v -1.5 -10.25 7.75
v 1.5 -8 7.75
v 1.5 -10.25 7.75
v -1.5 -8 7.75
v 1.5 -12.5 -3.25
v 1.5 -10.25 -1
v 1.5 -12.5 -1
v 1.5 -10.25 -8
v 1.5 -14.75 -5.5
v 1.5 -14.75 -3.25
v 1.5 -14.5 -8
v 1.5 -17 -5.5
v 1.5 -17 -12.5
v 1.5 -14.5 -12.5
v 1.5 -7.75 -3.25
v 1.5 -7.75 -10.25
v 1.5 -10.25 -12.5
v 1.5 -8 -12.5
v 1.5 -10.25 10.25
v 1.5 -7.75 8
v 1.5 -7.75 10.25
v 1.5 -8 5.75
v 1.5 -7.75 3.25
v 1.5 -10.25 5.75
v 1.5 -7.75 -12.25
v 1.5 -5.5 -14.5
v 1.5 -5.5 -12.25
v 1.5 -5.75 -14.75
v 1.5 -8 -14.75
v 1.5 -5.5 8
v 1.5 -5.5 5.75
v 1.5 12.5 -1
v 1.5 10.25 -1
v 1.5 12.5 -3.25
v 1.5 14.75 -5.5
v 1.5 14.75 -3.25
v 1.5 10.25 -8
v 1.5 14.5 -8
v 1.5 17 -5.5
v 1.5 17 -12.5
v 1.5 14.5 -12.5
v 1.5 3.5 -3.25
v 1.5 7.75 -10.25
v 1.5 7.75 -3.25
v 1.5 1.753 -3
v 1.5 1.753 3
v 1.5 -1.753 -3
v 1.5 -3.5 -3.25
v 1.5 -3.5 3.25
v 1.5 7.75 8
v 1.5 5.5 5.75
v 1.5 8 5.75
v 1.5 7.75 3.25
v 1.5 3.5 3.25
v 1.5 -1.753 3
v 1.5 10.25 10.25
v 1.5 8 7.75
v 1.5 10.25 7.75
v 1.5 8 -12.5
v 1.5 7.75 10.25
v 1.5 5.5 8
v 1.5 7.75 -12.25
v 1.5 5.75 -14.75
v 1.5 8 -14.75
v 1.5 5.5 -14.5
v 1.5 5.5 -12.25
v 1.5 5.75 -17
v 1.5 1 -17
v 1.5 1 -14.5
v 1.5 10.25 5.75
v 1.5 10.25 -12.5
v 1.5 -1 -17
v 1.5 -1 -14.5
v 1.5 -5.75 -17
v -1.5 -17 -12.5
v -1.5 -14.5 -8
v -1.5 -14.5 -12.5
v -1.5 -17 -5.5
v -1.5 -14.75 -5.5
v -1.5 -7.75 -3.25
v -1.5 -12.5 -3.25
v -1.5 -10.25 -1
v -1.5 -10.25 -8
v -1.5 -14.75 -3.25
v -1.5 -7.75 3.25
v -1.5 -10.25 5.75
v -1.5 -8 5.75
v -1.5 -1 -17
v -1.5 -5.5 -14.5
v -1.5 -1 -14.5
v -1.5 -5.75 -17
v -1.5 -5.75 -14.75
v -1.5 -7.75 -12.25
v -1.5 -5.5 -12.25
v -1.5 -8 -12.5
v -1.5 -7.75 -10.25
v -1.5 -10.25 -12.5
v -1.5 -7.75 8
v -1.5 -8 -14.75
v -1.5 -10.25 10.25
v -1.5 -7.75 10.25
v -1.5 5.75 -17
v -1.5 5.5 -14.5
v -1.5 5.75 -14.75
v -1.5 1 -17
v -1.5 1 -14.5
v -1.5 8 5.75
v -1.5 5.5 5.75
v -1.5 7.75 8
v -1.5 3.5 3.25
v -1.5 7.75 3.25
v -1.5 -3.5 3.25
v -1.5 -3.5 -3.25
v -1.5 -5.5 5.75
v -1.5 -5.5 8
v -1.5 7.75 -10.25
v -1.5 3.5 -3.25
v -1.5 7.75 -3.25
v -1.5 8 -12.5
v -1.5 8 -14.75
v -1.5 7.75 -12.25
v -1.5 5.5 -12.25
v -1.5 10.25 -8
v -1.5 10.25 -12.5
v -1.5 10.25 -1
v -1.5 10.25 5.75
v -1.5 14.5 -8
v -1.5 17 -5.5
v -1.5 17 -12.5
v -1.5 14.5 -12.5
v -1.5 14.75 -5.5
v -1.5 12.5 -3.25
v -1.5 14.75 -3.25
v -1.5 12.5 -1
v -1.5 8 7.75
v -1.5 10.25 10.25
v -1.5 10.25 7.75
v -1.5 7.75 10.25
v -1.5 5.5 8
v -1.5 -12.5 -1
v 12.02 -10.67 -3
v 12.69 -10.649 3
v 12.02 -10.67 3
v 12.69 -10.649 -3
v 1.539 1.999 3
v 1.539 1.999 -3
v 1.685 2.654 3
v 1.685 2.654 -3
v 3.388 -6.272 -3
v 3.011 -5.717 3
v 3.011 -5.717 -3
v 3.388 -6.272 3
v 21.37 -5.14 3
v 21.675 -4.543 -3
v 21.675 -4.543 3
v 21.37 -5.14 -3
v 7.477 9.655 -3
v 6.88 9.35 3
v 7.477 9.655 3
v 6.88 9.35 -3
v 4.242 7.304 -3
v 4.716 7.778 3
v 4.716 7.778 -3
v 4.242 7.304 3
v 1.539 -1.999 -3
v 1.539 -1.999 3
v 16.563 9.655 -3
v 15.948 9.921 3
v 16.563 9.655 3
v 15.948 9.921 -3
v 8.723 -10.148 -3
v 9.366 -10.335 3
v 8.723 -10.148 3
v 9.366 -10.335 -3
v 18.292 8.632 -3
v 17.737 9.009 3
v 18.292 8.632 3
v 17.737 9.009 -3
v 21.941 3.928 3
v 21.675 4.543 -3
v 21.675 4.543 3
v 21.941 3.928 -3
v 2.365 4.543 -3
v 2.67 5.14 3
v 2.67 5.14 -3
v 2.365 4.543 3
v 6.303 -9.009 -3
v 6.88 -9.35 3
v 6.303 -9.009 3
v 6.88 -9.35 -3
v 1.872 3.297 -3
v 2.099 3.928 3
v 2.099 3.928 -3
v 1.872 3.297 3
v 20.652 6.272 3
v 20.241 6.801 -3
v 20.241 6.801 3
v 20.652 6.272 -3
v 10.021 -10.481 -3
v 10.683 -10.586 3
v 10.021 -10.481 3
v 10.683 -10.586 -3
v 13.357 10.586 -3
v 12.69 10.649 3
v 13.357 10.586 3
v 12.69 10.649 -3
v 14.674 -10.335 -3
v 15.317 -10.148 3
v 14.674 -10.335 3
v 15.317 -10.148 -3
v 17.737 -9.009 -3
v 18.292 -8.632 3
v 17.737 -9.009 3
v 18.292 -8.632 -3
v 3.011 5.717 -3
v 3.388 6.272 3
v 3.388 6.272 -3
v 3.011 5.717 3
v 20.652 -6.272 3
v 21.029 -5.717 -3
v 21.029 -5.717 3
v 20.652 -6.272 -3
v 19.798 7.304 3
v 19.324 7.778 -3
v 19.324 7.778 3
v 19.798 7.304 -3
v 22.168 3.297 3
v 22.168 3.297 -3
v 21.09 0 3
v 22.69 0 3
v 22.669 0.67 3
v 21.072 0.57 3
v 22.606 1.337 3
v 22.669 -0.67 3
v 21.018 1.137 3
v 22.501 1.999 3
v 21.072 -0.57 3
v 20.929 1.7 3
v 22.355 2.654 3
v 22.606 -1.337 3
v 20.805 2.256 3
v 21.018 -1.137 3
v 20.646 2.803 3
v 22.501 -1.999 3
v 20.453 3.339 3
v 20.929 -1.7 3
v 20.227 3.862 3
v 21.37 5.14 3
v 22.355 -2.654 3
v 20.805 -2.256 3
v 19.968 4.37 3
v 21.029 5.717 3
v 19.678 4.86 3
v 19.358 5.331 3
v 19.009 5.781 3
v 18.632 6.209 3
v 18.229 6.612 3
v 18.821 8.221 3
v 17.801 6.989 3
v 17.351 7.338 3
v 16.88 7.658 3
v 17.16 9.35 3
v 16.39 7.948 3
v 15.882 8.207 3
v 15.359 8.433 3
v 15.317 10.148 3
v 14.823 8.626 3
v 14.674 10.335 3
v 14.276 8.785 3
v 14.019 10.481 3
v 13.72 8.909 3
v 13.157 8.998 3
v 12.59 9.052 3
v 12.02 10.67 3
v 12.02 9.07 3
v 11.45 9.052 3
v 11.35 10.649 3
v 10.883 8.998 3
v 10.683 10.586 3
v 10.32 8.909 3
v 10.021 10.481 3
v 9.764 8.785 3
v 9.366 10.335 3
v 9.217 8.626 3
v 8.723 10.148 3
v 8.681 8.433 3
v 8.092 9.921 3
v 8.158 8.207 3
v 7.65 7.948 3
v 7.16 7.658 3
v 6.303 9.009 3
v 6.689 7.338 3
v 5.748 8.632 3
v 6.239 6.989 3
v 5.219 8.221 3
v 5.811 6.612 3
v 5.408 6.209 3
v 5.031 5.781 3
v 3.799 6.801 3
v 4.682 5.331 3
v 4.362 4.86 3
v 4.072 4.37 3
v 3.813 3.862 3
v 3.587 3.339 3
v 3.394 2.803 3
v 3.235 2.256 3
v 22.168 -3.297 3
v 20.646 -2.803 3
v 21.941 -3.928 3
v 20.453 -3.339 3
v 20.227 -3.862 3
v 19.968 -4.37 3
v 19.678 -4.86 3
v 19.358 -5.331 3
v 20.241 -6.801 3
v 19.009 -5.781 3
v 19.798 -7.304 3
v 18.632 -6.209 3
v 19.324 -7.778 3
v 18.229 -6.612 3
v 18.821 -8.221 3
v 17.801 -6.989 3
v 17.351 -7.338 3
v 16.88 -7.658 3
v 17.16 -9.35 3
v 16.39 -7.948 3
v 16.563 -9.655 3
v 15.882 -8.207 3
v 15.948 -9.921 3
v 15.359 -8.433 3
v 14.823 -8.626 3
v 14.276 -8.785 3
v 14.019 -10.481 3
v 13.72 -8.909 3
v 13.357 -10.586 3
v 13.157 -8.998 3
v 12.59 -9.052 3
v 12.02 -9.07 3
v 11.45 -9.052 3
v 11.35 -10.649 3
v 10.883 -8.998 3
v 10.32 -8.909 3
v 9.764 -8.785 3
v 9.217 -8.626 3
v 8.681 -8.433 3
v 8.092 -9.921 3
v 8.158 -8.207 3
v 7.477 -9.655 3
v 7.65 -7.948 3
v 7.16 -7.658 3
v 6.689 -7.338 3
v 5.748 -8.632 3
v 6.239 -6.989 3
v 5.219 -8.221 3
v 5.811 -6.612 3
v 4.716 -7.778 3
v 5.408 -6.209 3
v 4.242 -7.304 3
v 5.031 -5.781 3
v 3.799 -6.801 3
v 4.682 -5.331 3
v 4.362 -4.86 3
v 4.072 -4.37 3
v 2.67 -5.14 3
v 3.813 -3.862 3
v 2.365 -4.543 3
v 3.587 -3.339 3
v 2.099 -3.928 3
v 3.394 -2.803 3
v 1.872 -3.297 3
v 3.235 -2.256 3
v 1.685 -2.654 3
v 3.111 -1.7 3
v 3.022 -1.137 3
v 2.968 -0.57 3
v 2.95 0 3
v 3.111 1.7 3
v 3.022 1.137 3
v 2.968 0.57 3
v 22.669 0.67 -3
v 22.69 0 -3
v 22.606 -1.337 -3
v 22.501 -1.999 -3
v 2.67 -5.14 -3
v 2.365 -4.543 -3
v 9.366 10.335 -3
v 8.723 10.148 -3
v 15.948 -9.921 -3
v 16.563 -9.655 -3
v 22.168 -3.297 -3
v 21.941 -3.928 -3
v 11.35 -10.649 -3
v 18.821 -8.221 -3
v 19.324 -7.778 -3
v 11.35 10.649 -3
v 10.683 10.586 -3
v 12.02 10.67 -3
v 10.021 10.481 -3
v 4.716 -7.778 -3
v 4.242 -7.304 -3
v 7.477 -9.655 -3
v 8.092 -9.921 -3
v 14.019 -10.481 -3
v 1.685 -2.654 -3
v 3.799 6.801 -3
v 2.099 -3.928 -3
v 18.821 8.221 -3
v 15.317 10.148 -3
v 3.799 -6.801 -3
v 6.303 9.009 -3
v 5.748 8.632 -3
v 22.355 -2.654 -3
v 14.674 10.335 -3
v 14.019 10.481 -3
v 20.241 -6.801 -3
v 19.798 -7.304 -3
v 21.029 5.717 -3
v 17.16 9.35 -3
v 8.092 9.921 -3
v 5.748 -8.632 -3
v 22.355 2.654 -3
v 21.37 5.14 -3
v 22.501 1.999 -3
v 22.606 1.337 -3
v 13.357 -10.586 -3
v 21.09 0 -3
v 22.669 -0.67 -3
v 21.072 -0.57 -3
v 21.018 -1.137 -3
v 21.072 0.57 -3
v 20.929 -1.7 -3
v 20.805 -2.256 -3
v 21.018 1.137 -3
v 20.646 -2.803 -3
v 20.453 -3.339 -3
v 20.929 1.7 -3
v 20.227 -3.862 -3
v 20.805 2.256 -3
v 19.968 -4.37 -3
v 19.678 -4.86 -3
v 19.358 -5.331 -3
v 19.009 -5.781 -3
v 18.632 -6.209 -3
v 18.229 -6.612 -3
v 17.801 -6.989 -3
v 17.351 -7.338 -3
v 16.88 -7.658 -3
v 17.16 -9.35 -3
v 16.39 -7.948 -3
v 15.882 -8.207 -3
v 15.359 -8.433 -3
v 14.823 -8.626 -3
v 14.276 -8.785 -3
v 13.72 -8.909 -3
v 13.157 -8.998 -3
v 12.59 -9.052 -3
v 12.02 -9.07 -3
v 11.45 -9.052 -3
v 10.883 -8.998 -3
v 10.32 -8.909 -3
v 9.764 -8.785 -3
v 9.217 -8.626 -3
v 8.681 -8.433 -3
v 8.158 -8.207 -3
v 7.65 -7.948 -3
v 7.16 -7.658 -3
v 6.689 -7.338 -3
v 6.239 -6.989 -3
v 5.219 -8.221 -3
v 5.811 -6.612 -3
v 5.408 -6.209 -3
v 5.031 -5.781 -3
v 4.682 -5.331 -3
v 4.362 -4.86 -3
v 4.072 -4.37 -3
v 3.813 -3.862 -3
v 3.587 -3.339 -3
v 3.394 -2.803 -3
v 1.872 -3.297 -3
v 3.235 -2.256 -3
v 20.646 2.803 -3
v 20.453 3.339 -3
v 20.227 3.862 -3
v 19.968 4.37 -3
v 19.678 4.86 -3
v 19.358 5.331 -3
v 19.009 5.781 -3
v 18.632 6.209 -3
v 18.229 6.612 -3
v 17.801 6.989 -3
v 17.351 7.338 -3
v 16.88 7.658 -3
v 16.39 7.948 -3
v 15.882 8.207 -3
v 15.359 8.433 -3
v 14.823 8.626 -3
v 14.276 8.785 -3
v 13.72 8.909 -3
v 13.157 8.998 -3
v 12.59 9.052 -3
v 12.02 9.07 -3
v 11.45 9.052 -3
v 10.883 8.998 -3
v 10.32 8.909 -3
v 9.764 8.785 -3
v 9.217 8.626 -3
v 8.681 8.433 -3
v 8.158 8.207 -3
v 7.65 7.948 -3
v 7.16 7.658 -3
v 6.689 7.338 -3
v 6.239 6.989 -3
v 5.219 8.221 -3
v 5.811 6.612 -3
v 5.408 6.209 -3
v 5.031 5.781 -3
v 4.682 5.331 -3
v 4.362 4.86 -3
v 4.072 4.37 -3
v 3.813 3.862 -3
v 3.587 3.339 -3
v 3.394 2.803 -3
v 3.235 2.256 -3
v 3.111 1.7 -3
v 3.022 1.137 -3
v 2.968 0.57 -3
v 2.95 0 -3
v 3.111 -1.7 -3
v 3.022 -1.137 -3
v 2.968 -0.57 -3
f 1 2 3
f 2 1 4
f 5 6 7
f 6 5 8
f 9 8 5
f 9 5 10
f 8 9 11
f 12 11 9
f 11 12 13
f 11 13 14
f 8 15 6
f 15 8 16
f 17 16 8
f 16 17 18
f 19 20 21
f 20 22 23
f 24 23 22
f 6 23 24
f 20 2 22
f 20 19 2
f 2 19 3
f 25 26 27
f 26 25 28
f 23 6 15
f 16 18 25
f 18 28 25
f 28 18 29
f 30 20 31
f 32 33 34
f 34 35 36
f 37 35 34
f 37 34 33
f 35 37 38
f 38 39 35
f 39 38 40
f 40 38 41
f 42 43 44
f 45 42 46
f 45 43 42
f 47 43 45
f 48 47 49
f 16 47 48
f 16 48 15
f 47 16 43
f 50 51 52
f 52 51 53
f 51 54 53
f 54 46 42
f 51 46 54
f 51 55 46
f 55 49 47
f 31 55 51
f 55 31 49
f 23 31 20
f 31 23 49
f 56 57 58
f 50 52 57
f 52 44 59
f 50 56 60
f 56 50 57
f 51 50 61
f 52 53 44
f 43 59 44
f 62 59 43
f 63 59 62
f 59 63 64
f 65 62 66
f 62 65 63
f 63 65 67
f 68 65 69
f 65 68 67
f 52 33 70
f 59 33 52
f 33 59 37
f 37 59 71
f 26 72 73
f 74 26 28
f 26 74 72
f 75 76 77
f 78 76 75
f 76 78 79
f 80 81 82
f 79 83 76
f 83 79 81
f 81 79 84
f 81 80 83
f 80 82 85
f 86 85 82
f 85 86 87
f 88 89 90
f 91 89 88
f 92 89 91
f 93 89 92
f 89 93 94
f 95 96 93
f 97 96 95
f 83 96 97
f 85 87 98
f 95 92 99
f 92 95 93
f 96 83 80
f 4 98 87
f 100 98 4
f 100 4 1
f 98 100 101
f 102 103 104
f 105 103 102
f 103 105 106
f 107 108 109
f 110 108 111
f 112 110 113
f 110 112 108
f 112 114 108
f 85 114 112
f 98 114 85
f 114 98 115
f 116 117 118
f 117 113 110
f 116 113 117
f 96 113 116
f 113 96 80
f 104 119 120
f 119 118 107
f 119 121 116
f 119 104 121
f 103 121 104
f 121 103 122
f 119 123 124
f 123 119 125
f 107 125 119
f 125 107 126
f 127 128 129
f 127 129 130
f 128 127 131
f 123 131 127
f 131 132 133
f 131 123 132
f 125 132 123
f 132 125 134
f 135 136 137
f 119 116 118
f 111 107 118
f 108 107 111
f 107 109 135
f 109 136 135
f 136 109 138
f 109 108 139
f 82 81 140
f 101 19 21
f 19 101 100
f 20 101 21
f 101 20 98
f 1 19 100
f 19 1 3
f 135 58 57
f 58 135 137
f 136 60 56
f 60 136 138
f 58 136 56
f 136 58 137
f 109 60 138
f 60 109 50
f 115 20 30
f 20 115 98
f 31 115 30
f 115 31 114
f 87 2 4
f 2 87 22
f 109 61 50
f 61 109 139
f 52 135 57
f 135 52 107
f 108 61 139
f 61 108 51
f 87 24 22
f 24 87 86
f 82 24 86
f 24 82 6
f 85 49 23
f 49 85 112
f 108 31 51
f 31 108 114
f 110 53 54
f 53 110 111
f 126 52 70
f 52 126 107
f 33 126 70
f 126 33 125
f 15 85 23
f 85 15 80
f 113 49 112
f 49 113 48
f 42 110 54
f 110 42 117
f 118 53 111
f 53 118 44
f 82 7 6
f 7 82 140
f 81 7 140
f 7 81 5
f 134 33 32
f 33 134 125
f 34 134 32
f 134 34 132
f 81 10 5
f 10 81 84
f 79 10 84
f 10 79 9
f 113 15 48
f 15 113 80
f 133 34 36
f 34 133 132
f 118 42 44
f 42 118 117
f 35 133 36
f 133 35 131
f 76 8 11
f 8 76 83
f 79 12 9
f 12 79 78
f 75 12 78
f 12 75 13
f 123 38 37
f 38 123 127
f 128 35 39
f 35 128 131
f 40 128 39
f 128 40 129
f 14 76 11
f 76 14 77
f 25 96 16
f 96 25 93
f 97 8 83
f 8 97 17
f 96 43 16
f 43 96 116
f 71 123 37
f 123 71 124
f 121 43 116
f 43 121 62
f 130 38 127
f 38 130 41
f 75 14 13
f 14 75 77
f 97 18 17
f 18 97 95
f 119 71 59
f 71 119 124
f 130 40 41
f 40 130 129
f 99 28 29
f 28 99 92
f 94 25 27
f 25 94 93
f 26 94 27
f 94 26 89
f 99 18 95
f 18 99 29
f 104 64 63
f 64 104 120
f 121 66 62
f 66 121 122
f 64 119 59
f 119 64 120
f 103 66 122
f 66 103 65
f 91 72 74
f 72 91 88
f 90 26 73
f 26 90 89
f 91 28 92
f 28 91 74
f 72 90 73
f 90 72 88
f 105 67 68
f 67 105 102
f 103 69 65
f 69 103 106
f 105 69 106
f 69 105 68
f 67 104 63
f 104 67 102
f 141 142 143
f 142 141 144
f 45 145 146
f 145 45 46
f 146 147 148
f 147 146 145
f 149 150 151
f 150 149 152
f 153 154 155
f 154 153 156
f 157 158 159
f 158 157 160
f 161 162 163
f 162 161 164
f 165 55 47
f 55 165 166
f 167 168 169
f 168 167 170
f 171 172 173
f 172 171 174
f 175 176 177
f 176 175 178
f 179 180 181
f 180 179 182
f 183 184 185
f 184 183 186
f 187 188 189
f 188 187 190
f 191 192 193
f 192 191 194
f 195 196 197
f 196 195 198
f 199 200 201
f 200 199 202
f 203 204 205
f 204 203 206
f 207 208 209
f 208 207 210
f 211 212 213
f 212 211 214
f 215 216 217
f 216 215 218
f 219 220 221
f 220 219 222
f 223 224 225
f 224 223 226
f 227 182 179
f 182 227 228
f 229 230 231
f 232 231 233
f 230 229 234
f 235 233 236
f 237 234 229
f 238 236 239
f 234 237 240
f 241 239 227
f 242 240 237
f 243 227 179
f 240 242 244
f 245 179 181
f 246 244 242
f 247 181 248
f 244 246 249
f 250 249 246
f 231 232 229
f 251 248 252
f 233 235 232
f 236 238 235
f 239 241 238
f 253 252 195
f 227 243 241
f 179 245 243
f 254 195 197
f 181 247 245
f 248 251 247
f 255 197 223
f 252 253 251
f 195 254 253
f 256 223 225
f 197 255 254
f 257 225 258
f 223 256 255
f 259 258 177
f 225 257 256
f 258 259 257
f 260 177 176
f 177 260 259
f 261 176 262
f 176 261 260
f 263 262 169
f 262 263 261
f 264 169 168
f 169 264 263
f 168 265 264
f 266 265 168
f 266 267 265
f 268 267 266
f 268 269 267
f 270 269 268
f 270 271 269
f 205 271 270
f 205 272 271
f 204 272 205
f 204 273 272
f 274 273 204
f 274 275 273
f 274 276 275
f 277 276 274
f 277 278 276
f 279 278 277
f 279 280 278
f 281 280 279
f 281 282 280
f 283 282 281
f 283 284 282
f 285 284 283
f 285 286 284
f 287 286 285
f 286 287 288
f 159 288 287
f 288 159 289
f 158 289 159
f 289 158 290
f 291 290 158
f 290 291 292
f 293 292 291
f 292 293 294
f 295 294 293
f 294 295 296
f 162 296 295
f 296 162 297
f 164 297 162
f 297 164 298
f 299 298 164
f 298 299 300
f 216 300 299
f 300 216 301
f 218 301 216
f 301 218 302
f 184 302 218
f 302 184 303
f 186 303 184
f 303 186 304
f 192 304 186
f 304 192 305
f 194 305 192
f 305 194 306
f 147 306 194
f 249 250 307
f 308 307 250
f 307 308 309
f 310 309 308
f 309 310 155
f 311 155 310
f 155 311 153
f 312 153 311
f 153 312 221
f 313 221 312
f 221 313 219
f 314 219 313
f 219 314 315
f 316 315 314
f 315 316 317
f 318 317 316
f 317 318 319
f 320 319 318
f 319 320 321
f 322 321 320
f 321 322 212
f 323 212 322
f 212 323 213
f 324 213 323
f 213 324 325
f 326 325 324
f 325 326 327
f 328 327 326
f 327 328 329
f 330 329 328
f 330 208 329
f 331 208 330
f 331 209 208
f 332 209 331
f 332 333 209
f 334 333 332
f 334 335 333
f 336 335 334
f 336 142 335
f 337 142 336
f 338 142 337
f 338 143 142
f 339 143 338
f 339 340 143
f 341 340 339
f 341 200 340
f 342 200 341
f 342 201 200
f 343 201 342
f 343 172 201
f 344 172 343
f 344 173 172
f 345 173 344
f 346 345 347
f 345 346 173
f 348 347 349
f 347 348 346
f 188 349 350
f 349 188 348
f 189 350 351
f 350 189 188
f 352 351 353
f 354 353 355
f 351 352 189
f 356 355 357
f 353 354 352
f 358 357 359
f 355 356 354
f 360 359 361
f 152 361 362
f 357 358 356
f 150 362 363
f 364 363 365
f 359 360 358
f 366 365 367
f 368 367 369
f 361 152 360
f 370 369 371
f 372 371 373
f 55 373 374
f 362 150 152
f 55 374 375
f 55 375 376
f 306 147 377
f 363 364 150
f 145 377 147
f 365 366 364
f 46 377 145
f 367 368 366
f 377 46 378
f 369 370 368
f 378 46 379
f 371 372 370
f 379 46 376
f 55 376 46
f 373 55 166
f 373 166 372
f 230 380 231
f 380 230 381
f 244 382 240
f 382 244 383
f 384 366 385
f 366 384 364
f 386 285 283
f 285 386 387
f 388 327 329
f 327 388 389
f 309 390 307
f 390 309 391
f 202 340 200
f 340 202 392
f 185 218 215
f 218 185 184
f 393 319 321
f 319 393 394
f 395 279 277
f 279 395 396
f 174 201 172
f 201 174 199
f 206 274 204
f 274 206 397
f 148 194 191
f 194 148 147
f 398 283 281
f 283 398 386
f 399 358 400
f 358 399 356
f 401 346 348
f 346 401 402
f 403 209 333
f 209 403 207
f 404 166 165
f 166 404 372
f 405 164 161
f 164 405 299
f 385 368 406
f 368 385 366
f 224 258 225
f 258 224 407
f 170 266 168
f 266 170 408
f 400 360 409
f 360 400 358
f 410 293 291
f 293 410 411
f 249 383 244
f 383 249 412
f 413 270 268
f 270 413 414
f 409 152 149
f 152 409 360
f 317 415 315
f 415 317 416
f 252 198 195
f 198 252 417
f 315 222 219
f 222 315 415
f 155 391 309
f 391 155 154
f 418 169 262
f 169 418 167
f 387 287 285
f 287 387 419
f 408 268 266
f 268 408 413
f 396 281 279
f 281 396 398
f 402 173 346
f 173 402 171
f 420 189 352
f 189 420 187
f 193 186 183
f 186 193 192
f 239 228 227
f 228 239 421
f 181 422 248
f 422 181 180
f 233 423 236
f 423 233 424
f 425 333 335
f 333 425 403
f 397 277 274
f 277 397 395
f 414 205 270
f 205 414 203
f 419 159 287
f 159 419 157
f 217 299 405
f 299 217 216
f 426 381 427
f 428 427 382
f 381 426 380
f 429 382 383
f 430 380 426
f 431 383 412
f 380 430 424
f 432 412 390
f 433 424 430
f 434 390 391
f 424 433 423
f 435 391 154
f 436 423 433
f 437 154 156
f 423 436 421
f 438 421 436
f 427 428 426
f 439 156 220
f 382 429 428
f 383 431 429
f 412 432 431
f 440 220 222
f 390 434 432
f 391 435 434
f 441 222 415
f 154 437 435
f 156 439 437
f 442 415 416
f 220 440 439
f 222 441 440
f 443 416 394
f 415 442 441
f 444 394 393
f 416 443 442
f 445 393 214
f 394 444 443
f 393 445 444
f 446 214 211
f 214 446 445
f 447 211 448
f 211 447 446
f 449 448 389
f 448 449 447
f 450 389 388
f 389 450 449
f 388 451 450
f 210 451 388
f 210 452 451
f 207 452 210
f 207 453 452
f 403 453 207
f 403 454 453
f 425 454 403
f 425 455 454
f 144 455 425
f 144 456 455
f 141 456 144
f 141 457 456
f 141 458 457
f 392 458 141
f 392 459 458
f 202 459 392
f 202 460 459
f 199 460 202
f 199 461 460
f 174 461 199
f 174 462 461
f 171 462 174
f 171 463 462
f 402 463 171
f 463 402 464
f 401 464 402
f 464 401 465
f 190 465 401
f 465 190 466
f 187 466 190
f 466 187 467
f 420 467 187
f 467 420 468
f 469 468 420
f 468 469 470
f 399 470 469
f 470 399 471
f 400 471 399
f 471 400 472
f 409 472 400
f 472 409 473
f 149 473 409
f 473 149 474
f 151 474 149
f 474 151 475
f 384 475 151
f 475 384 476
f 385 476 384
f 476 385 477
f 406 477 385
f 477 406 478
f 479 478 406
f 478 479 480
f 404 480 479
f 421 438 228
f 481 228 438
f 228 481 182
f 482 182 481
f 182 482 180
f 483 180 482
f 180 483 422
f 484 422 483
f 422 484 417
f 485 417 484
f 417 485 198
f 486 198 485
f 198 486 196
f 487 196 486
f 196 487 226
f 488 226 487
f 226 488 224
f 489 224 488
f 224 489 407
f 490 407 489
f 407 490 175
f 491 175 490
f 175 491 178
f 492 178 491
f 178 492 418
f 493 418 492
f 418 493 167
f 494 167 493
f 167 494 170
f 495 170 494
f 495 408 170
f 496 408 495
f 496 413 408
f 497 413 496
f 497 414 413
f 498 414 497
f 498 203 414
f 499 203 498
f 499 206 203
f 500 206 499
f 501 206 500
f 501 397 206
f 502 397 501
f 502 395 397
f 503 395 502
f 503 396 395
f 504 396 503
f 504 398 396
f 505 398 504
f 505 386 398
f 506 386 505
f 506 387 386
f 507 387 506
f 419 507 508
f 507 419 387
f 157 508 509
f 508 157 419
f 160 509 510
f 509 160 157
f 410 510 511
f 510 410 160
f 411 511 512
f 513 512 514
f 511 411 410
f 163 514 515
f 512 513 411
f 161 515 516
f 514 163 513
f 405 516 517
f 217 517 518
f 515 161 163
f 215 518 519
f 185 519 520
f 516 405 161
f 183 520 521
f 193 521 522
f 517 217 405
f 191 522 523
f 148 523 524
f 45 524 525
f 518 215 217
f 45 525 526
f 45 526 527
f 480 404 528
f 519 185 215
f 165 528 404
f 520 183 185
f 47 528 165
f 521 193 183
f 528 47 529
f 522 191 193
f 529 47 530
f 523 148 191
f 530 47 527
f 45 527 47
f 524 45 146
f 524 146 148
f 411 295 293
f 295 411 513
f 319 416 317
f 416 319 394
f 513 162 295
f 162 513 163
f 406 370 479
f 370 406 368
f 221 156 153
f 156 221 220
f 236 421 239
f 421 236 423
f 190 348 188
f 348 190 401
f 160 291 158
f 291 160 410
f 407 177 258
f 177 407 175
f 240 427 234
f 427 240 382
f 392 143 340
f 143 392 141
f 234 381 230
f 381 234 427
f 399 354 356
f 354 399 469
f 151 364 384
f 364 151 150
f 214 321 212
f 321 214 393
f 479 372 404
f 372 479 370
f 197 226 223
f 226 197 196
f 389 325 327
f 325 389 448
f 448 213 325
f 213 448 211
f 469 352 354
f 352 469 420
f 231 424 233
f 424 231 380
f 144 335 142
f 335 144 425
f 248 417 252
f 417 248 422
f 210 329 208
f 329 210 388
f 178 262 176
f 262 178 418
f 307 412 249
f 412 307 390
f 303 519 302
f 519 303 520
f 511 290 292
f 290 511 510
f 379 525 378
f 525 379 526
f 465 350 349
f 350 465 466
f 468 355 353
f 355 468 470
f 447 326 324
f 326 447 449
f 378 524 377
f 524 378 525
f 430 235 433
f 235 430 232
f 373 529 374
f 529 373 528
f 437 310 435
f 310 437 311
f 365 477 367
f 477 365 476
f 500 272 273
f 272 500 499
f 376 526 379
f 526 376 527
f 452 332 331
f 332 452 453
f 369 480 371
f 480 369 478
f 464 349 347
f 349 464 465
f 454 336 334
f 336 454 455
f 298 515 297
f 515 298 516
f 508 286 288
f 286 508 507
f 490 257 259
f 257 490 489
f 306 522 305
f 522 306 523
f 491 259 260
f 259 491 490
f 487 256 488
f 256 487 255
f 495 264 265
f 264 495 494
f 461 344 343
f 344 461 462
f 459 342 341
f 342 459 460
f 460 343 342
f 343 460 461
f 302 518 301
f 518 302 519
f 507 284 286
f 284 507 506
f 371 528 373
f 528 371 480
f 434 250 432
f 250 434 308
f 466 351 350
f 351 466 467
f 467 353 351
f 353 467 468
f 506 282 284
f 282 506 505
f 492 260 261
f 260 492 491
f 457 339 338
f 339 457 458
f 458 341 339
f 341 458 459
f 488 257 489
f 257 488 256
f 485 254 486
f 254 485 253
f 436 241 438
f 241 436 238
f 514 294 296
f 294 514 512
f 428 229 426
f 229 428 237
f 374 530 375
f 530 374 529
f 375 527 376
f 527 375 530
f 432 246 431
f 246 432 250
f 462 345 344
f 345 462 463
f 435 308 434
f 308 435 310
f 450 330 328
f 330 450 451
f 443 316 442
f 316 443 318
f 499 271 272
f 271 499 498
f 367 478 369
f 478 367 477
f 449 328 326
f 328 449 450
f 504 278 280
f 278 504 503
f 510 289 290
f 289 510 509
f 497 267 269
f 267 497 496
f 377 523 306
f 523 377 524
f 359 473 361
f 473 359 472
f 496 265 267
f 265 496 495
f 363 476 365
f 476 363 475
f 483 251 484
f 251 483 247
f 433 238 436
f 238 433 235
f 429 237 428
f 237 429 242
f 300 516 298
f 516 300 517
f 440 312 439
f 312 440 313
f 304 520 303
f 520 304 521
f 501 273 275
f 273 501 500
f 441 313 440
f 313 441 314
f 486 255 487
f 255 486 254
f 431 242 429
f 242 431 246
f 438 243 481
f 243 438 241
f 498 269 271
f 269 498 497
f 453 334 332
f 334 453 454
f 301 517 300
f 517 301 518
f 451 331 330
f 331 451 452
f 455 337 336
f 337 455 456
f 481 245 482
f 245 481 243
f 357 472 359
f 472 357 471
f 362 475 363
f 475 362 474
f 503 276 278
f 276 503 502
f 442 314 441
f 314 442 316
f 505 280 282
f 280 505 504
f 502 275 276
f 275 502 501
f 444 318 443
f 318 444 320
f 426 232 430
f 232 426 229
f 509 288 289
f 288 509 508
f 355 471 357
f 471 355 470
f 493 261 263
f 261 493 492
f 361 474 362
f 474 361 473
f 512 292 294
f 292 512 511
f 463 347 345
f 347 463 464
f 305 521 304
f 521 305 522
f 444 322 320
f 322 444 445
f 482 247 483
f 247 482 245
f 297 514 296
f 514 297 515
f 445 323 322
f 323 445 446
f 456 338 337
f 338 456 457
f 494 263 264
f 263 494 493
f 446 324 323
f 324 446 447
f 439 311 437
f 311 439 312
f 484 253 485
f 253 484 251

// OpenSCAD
//preview[view:west, tilt:side]
ring_thickness = 1.6; //[0.8:Thin,1.6:Normal,2.4:Thick]
ring_width = 6; //[6:12]
shape = 3; //[0:Custom,1:SpaceShip,2:Alien1,3:Alien2,4:Heart,5:Bow,6:Mushroom,7:Skull,8:WaitCursor,9:Pacman1,10:Pacman2]
//You can enter you own shape array here:
Custom = "[[0,0,0]]";
//Size of the pixel art object
objectSize = 50;
//Thickness of the pixel art object
objectThickness = 3;
gridRows = 2 * 10; //can't find a better to to get the customizer to ignore it 

//Pixel Width
unitWidth = objectSize / gridRows;


unitLength = unitWidth;
distance = unitWidth;

//(US Ring Sizes)
ring_size = 18.14; //[11.63:0,11.84:0.25,12.04:0.5,12.24:0.75,12.45:1,12.65:1.25,12.85:1.5,13.06:1.75,13.26:2,13.46:2.25,13.67:2.5,13.87:2.75,14.07:3,14.27:3.25,14.48:3.5,14.68:3.75,14.88:4,15.09:4.25,15.29:4.5,15.49:4.75,2215.9:5.25,16.1:5.5,16.31:5.75,16.51:6,16.71:6.25,16.92:6.5,17.12:6.75,17.32:7,17.53:7.25,17.73:7.5,17.93:7.75,18.14:8,18.34:8.25,18.54:8.5,18.75:8.75,18.95:9,19.15:9.25,19.35:9.5,19.56:9.75,19.76:10,19.96:10.25,20.17:10.5,20.37:10.75,20.57:11,20.78:11.25,20.98:11.5,21.18:11.75,21.39:12,21.59:12.25,21.79:12.5,22:12.75,22.2:13,22.4:13.25,22.61:13.5,22.81:13.75,23.01:14,23.22:14.25,23.42:14.5,23.62:14.75,23.83:15,24.03:15.25,24.23:15.5,24.43:15.75,24.64:16]


//Shapes

SpaceShip1 = [
    [-5, -3, 0],
    [-5, 3, 0],
    [-4, -2, 0],
    [-4, 2, 0],
    [-3, -1, 0],
    [-3, 0, 0],
    [-3, 1, 0],
    [-2, -2, 0],
    [-2, -1, 0],
    [-2, 0, 0],
    [-2, 1, 0],
    [-2, 2, 0],
    [-1, -3, 0],
    [-1, -2, 0],
    [-1, -1, 0],
    [-1, 0, 0],
    [-1, 1, 0],
    [-1, 2, 0],
    [-1, 3, 0],
    [0, -5, 0],
    [0, -4, 0],
    [0, -3, 0],
    [0, -1, 0],
    [0, 1, 0],
    [0, 3, 0],
    [0, 4, 0],
    [0, 5, 0],
    [1, -3, 0],
    [1, -2, 0],
    [1, -1, 0],
    [1, 0, 0],
    [1, 1, 0],
    [1, 2, 0],
    [1, 3, 0],
    [2, -2, 0],
    [2, -1, 0],
    [2, 0, 0],
    [2, 1, 0],
    [2, 2, 0],
    [3, -1, 0],
    [3, 0, 0],
    [3, 1, 0],
    [4, -2, 0],
    [4, 2, 0],
    [5, -3, 0],
    [5, 3, 0]
];

Alien1 = [
    [-6, -2, 0],
    [-6, -1, 0],
    [-6, 0, 0],
    [-6, 1, 0],
    [-6, 2, 0],
    [-5, -2, 0],
    [-5, 0, 0],
    [-5, 2, 0],
    [-4, -2, 0],
    [-4, -1, 0],
    [-4, 0, 0],
    [-4, 1, 0],
    [-4, 2, 0],
    [-3, 0, 0],
    [-2, -3, 0],
    [-2, -2, 0],
    [-2, -1, 0],
    [-2, 0, 0],
    [-2, 1, 0],
    [-2, 2, 0],
    [-2, 3, 0],
    [-1, -4, 0],
    [-1, -3, 0],
    [-1, -1, 0],
    [-1, 0, 0],
    [-1, 1, 0],
    [-1, 3, 0],
    [-1, 4, 0],
    [0, -4, 0],
    [0, -1, 0],
    [0, 0, 0],
    [0, 1, 0],
    [0, 4, 0],
    [1, -5, 0],
    [1, -4, 0],
    [1, -1, 0],
    [1, 0, 0],
    [1, 1, 0],
    [1, 4, 0],
    [1, 5, 0],
    [2, -5, 0],
    [2, -1, 0],
    [2, 0, 0],
    [2, 1, 0],
    [2, 5, 0],
    [3, -1, 0],
    [3, 0, 0],
    [3, 1, 0],
    [4, -3, 0],
    [4, -2, 0],
    [4, -1, 0],
    [4, 0, 0],
    [4, 1, 0],
    [4, 2, 0],
    [4, 3, 0],
    [5, -3, 0],
    [5, 3, 0],
    [6, -3, 0],
    [6, 3, 0],
    [7, -5, 0],
    [7, -4, 0],
    [7, -3, 0],
    [7, 3, 0],
    [7, 4, 0],
    [7, 5, 0]
];

Alien2 = [
    [-4, -4, 0],
    [-4, 4, 0],
    [-3, -3, 0],
    [-3, 3, 0],
    [-2, -4, 0],
    [-2, -3, 0],
    [-2, -2, 0],
    [-2, -1, 0],
    [-2, 0, 0],
    [-2, 1, 0],
    [-2, 2, 0],
    [-2, 3, 0],
    [-2, 4, 0],
    [-1, -4, 0],
    [-1, -1, 0],
    [-1, 0, 0],
    [-1, 1, 0],
    [-1, 4, 0],
    [0, -4, 0],
    [0, -1, 0],
    [0, 0, 0],
    [0, 1, 0],
    [0, 4, 0],
    [1, -5, 0],
    [1, -4, 0],
    [1, -1, 0],
    [1, 0, 0],
    [1, 1, 0],
    [1, 4, 0],
    [1, 5, 0],
    [2, -6, 0],
    [2, -5, 0],
    [2, -4, 0],
    [2, -3, 0],
    [2, -2, 0],
    [2, -1, 0],
    [2, 0, 0],
    [2, 1, 0],
    [2, 2, 0],
    [2, 3, 0],
    [2, 4, 0],
    [2, 5, 0],
    [2, 6, 0],
    [3, -7, 0],
    [3, -6, 0],
    [3, -5, 0],
    [3, -4, 0],
    [3, -3, 0],
    [3, -2, 0],
    [3, -1, 0],
    [3, 0, 0],
    [3, 1, 0],
    [3, 2, 0],
    [3, 3, 0],
    [3, 4, 0],
    [3, 5, 0],
    [3, 6, 0],
    [3, 7, 0],
    [4, -7, 0],
    [4, -4, 0],
    [4, -3, 0],
    [4, -2, 0],
    [4, -1, 0],
    [4, 0, 0],
    [4, 1, 0],
    [4, 2, 0],
    [4, 3, 0],
    [4, 4, 0],
    [4, 7, 0],
    [5, -7, 0],
    [5, -4, 0],
    [5, 4, 0],
    [5, 7, 0],
    [6, -3, 0],
    [6, 3, 0],
    [7, -2, 0],
    [7, -1, 0],
    [7, 1, 0],
    [7, 2, 0]
];


Heart = [
    [-2, -4, 0],
    [-2, -3, 0],
    [-2, -2, 0],
    [-2, 2, 0],
    [-2, 3, 0],
    [-2, 4, 0],
    [-1, -5, 0],
    [-1, -4, 0],
    [-1, -2, 0],
    [-1, -1, 0],
    [-1, 1, 0],
    [-1, 2, 0],
    [-1, 3, 0],
    [-1, 4, 0],
    [-1, 5, 0],
    [0, -5, 0],
    [0, -3, 0],
    [0, -2, 0],
    [0, -1, 0],
    [0, 0, 0],
    [0, 1, 0],
    [0, 2, 0],
    [0, 3, 0],
    [0, 4, 0],
    [0, 5, 0],
    [1, -5, 0],
    [1, -3, 0],
    [1, -2, 0],
    [1, -1, 0],
    [1, 0, 0],
    [1, 1, 0],
    [1, 2, 0],
    [1, 3, 0],
    [1, 4, 0],
    [1, 5, 0],
    [2, -5, 0],
    [2, -4, 0],
    [2, -3, 0],
    [2, -2, 0],
    [2, -1, 0],
    [2, 0, 0],
    [2, 1, 0],
    [2, 2, 0],
    [2, 3, 0],
    [2, 4, 0],
    [2, 5, 0],
    [3, -4, 0],
    [3, -3, 0],
    [3, -2, 0],
    [3, -1, 0],
    [3, 0, 0],
    [3, 1, 0],
    [3, 2, 0],
    [3, 3, 0],
    [3, 4, 0],
    [4, -3, 0],
    [4, -2, 0],
    [4, -1, 0],
    [4, 0, 0],
    [4, 1, 0],
    [4, 2, 0],
    [4, 3, 0],
    [5, -2, 0],
    [5, -1, 0],
    [5, 0, 0],
    [5, 1, 0],
    [5, 2, 0],
    [6, -1, 0],
    [6, 0, 0],
    [6, 1, 0],
    [7, 0, 0]
];

Mushroom1 = [
    [-9, -2, 0],
    [-9, -1, 0],
    [-9, 0, 0],
    [-9, 1, 0],
    [-9, 2, 0],
    [-9, 3, 0],
    [-8, -4, 0],
    [-8, -3, 0],
    [-8, -2, 0],
    [-8, -1, 0],
    [-8, 2, 0],
    [-8, 3, 0],
    [-8, 4, 0],
    [-8, 5, 0],
    [-7, -5, 0],
    [-7, -4, 0],
    [-7, -3, 0],
    [-7, -2, 0],
    [-7, -1, 0],
    [-7, 2, 0],
    [-7, 3, 0],
    [-7, 4, 0],
    [-7, 5, 0],
    [-7, 6, 0],
    [-6, -6, 0],
    [-6, -5, 0],
    [-6, -3, 0],
    [-6, -2, 0],
    [-6, 3, 0],
    [-6, 4, 0],
    [-6, 6, 0],
    [-6, 7, 0],
    [-5, -6, 0],
    [-5, 7, 0],
    [-4, -7, 0],
    [-4, -6, 0],
    [-4, -5, 0],
    [-4, 6, 0],
    [-4, 7, 0],
    [-4, 8, 0],
    [-3, -7, 0],
    [-3, -6, 0],
    [-3, -5, 0],
    [-3, -4, 0],
    [-3, 5, 0],
    [-3, 6, 0],
    [-3, 7, 0],
    [-3, 8, 0],
    [-2, -7, 0],
    [-2, -6, 0],
    [-2, -5, 0],
    [-2, -4, 0],
    [-2, -1, 0],
    [-2, 0, 0],
    [-2, 1, 0],
    [-2, 2, 0],
    [-2, 5, 0],
    [-2, 6, 0],
    [-2, 7, 0],
    [-2, 8, 0],
    [-1, -7, 0],
    [-1, -6, 0],
    [-1, -5, 0],
    [-1, -1, 0],
    [-1, 0, 0],
    [-1, 1, 0],
    [-1, 2, 0],
    [-1, 6, 0],
    [-1, 7, 0],
    [-1, 8, 0],
    [0, -7, 0],
    [0, -6, 0],
    [0, -5, 0],
    [0, -2, 0],
    [0, -1, 0],
    [0, 0, 0],
    [0, 1, 0],
    [0, 2, 0],
    [0, 3, 0],
    [0, 6, 0],
    [0, 7, 0],
    [0, 8, 0],
    [1, -7, 0],
    [1, -1, 0],
    [1, 0, 0],
    [1, 1, 0],
    [1, 2, 0],
    [1, 8, 0],
    [2, -7, 0],
    [2, -4, 0],
    [2, -3, 0],
    [2, -2, 0],
    [2, -1, 0],
    [2, 0, 0],
    [2, 1, 0],
    [2, 2, 0],
    [2, 3, 0],
    [2, 4, 0],
    [2, 5, 0],
    [2, 8, 0],
    [3, -7, 0],
    [3, -4, 0],
    [3, -1, 0],
    [3, 2, 0],
    [3, 5, 0],
    [3, 8, 0],
    [4, -7, 0],
    [4, -6, 0],
    [4, -5, 0],
    [4, -1, 0],
    [4, 2, 0],
    [4, 6, 0],
    [4, 7, 0],
    [4, 8, 0],
    [5, -6, 0],
    [5, -5, 0],
    [5, 6, 0],
    [5, 7, 0],
    [6, -5, 0],
    [6, 6, 0],
    [7, -5, 0],
    [7, -4, 0],
    [7, 5, 0],
    [7, 6, 0],
    [8, -4, 0],
    [8, -3, 0],
    [8, -2, 0],
    [8, -1, 0],
    [8, 0, 0],
    [8, 1, 0],
    [8, 2, 0],
    [8, 3, 0],
    [8, 4, 0],
    [8, 5, 0]
];;

Mushroom2 = [
    [-7, -2, 0],
    [-7, -1, 0],
    [-7, 0, 0],
    [-7, 1, 0],
    [-7, 2, 0],
    [-7, 3, 0],
    [-6, -4, 0],
    [-6, -3, 0],
    [-6, 4, 0],
    [-6, 5, 0],
    [-5, -5, 0],
    [-5, -4, 0],
    [-5, -3, 0],
    [-5, 4, 0],
    [-5, 5, 0],
    [-5, 6, 0],
    [-4, -6, 0],
    [-4, -5, 0],
    [-4, 6, 0],
    [-4, 7, 0],
    [-3, -6, 0],
    [-3, -5, 0],
    [-3, 6, 0],
    [-3, 7, 0],
    [-2, -7, 0],
    [-2, -6, 0],
    [-2, -5, 0],
    [-2, -4, 0],
    [-2, -1, 0],
    [-2, 0, 0],
    [-2, 1, 0],
    [-2, 2, 0],
    [-2, 5, 0],
    [-2, 6, 0],
    [-2, 7, 0],
    [-2, 8, 0],
    [-1, -7, 0],
    [-1, -6, 0],
    [-1, -5, 0],
    [-1, -4, 0],
    [-1, -2, 0],
    [-1, -1, 0],
    [-1, 0, 0],
    [-1, 1, 0],
    [-1, 2, 0],
    [-1, 3, 0],
    [-1, 5, 0],
    [-1, 6, 0],
    [-1, 7, 0],
    [-1, 8, 0],
    [0, -7, 0],
    [0, -2, 0],
    [0, -1, 0],
    [0, 0, 0],
    [0, 1, 0],
    [0, 2, 0],
    [0, 3, 0],
    [0, 6, 0],
    [0, 7, 0],
    [0, 8, 0],
    [1, -7, 0],
    [1, -1, 0],
    [1, 0, 0],
    [1, 1, 0],
    [1, 2, 0],
    [1, 8, 0],
    [2, -7, 0],
    [2, -4, 0],
    [2, -3, 0],
    [2, -2, 0],
    [2, -1, 0],
    [2, 0, 0],
    [2, 1, 0],
    [2, 2, 0],
    [2, 3, 0],
    [2, 4, 0],
    [2, 5, 0],
    [2, 8, 0],
    [3, -7, 0],
    [3, -4, 0],
    [3, -1, 0],
    [3, 2, 0],
    [3, 5, 0],
    [3, 8, 0],
    [4, -7, 0],
    [4, -6, 0],
    [4, -5, 0],
    [4, -4, 0],
    [4, -1, 0],
    [4, 2, 0],
    [4, 5, 0],
    [4, 6, 0],
    [4, 7, 0],
    [4, 8, 0],
    [5, -6, 0],
    [5, -5, 0],
    [5, 6, 0],
    [5, 7, 0],
    [6, -5, 0],
    [6, 6, 0],
    [7, -5, 0],
    [7, -4, 0],
    [7, 5, 0],
    [7, 6, 0],
    [8, -4, 0],
    [8, -3, 0],
    [8, -2, 0],
    [8, -1, 0],
    [8, 0, 0],
    [8, 1, 0],
    [8, 2, 0],
    [8, 3, 0],
    [8, 4, 0],
    [8, 5, 0]
];


Skull1 = [
    [-4, -3, 0],
    [-4, -2, 0],
    [-4, -1, 0],
    [-4, 0, 0],
    [-4, 1, 0],
    [-4, 2, 0],
    [-4, 3, 0],
    [-3, -4, 0],
    [-3, -3, 0],
    [-3, -2, 0],
    [-3, -1, 0],
    [-3, 0, 0],
    [-3, 1, 0],
    [-3, 2, 0],
    [-3, 3, 0],
    [-3, 4, 0],
    [-2, -5, 0],
    [-2, -4, 0],
    [-2, -3, 0],
    [-2, -2, 0],
    [-2, -1, 0],
    [-2, 0, 0],
    [-2, 1, 0],
    [-2, 2, 0],
    [-2, 3, 0],
    [-2, 4, 0],
    [-2, 5, 0],
    [-1, -5, 0],
    [-1, -4, 0],
    [-1, 0, 0],
    [-1, 4, 0],
    [-1, 5, 0],
    [0, -5, 0],
    [0, -4, 0],
    [0, 0, 0],
    [0, 4, 0],
    [0, 5, 0],
    [1, -5, 0],
    [1, -4, 0],
    [1, 0, 0],
    [1, 4, 0],
    [1, 5, 0],
    [2, -5, 0],
    [2, -4, 0],
    [2, -3, 0],
    [2, -2, 0],
    [2, -1, 0],
    [2, 0, 0],
    [2, 1, 0],
    [2, 2, 0],
    [2, 3, 0],
    [2, 4, 0],
    [2, 5, 0],
    [3, -4, 0],
    [3, -3, 0],
    [3, -1, 0],
    [3, 1, 0],
    [3, 3, 0],
    [3, 4, 0],
    [4, -3, 0],
    [4, -1, 0],
    [4, 1, 0],
    [4, 3, 0],
    [5, -3, 0],
    [5, -1, 0],
    [5, 1, 0],
    [5, 3, 0],
    [6, -3, 0],
    [6, -1, 0],
    [6, 1, 0],
    [6, 3, 0],
    [7, -3, 0],
    [7, -2, 0],
    [7, -1, 0],
    [7, 0, 0],
    [7, 1, 0],
    [7, 2, 0],
    [7, 3, 0]
];


Wait1 = [
    [-10, -5, 0],
    [-10, -4, 0],
    [-10, -3, 0],
    [-10, -2, 0],
    [-10, -1, 0],
    [-10, 0, 0],
    [-10, 1, 0],
    [-10, 2, 0],
    [-10, 3, 0],
    [-10, 4, 0],
    [-10, 5, 0],
    [-9, -5, 0],
    [-9, 5, 0],
    [-8, -5, 0],
    [-8, -4, 0],
    [-8, -3, 0],
    [-8, -2, 0],
    [-8, -1, 0],
    [-8, 0, 0],
    [-8, 1, 0],
    [-8, 2, 0],
    [-8, 3, 0],
    [-8, 4, 0],
    [-8, 5, 0],
    [-7, -4, 0],
    [-7, 4, 0],
    [-6, -4, 0],
    [-6, -2, 0],
    [-6, 0, 0],
    [-6, 2, 0],
    [-6, 4, 0],
    [-5, -4, 0],
    [-5, -1, 0],
    [-5, 1, 0],
    [-5, 4, 0],
    [-4, -4, 0],
    [-4, 0, 0],
    [-4, 4, 0],
    [-3, -4, 0],
    [-3, 4, 0],
    [-2, -3, 0],
    [-2, -2, 0],
    [-2, 0, 0],
    [-2, 2, 0],
    [-2, 3, 0],
    [-1, -2, 0],
    [-1, -1, 0],
    [-1, 1, 0],
    [-1, 2, 0],
    [0, -1, 0],
    [0, 1, 0],
    [1, -2, 0],
    [1, -1, 0],
    [1, 1, 0],
    [1, 2, 0],
    [2, -3, 0],
    [2, -2, 0],
    [2, 0, 0],
    [2, 2, 0],
    [2, 3, 0],
    [3, -4, 0],
    [3, 4, 0],
    [4, -4, 0],
    [4, 0, 0],
    [4, 4, 0],
    [5, -4, 0],
    [5, -1, 0],
    [5, 1, 0],
    [5, 4, 0],
    [6, -4, 0],
    [6, -2, 0],
    [6, 0, 0],
    [6, 2, 0],
    [6, 4, 0],
    [7, -5, 0],
    [7, -4, 0],
    [7, -3, 0],
    [7, -2, 0],
    [7, -1, 0],
    [7, 0, 0],
    [7, 1, 0],
    [7, 2, 0],
    [7, 3, 0],
    [7, 4, 0],
    [7, 5, 0],
    [8, -5, 0],
    [8, 5, 0],
    [9, -5, 0],
    [9, -4, 0],
    [9, -3, 0],
    [9, -2, 0],
    [9, -1, 0],
    [9, 0, 0],
    [9, 1, 0],
    [9, 2, 0],
    [9, 3, 0],
    [9, 4, 0],
    [9, 5, 0]
];

Pacman1 = [
    [-6, -2, 0],
    [-6, -1, 0],
    [-6, 0, 0],
    [-6, 1, 0],
    [-6, 2, 0],
    [-5, -4, 0],
    [-5, -3, 0],
    [-5, -2, 0],
    [-5, -1, 0],
    [-5, 0, 0],
    [-5, 1, 0],
    [-5, 2, 0],
    [-5, 3, 0],
    [-5, 4, 0],
    [-4, -5, 0],
    [-4, -4, 0],
    [-4, -3, 0],
    [-4, -2, 0],
    [-4, -1, 0],
    [-4, 0, 0],
    [-4, 1, 0],
    [-4, 2, 0],
    [-4, 3, 0],
    [-4, 4, 0],
    [-4, 5, 0],
    [-3, -5, 0],
    [-3, -4, 0],
    [-3, -3, 0],
    [-3, -2, 0],
    [-3, -1, 0],
    [-3, 0, 0],
    [-3, 1, 0],
    [-3, 2, 0],
    [-3, 3, 0],
    [-3, 4, 0],
    [-3, 5, 0],
    [-2, -6, 0],
    [-2, -5, 0],
    [-2, -4, 0],
    [-2, -3, 0],
    [-2, -2, 0],
    [-2, -1, 0],
    [-2, 0, 0],
    [-2, 1, 0],
    [-2, 2, 0],
    [-2, 3, 0],
    [-1, -6, 0],
    [-1, -5, 0],
    [-1, -4, 0],
    [-1, -3, 0],
    [-1, -2, 0],
    [-1, -1, 0],
    [-1, 0, 0],
    [0, -6, 0],
    [0, -5, 0],
    [0, -4, 0],
    [0, -3, 0],
    [0, -2, 0],
    [1, -6, 0],
    [1, -5, 0],
    [1, -4, 0],
    [1, -3, 0],
    [1, -2, 0],
    [1, -1, 0],
    [1, 0, 0],
    [2, -6, 0],
    [2, -5, 0],
    [2, -4, 0],
    [2, -3, 0],
    [2, -2, 0],
    [2, -1, 0],
    [2, 0, 0],
    [2, 1, 0],
    [2, 2, 0],
    [2, 3, 0],
    [3, -5, 0],
    [3, -4, 0],
    [3, -3, 0],
    [3, -2, 0],
    [3, -1, 0],
    [3, 0, 0],
    [3, 1, 0],
    [3, 2, 0],
    [3, 3, 0],
    [3, 4, 0],
    [3, 5, 0],
    [4, -5, 0],
    [4, -4, 0],
    [4, -3, 0],
    [4, -2, 0],
    [4, -1, 0],
    [4, 0, 0],
    [4, 1, 0],
    [4, 2, 0],
    [4, 3, 0],
    [4, 4, 0],
    [4, 5, 0],
    [5, -4, 0],
    [5, -3, 0],
    [5, -2, 0],
    [5, -1, 0],
    [5, 0, 0],
    [5, 1, 0],
    [5, 2, 0],
    [5, 3, 0],
    [5, 4, 0],
    [6, -2, 0],
    [6, -1, 0],
    [6, 0, 0],
    [6, 1, 0],
    [6, 2, 0]
];

Pacman2 = [
    [-10, -3, 0],
    [-10, -2, 0],
    [-10, -1, 0],
    [-10, 0, 0],
    [-10, 1, 0],
    [-10, 2, 0],
    [-10, 3, 0],
    [-9, -6, 0],
    [-9, -5, 0],
    [-9, -4, 0],
    [-9, -3, 0],
    [-9, -2, 0],
    [-9, -1, 0],
    [-9, 0, 0],
    [-9, 1, 0],
    [-9, 2, 0],
    [-9, 3, 0],
    [-9, 4, 0],
    [-9, 5, 0],
    [-9, 6, 0],
    [-8, -6, 0],
    [-8, -5, 0],
    [-8, -4, 0],
    [-8, -3, 0],
    [-8, -2, 0],
    [-8, -1, 0],
    [-8, 0, 0],
    [-8, 1, 0],
    [-8, 2, 0],
    [-8, 3, 0],
    [-8, 4, 0],
    [-8, 5, 0],
    [-8, 6, 0],
    [-7, -7, 0],
    [-7, -6, 0],
    [-7, -5, 0],
    [-7, -4, 0],
    [-7, -3, 0],
    [-7, -2, 0],
    [-7, -1, 0],
    [-7, 0, 0],
    [-7, 1, 0],
    [-7, 2, 0],
    [-7, 3, 0],
    [-7, 4, 0],
    [-7, 5, 0],
    [-7, 6, 0],
    [-7, 7, 0],
    [-6, -8, 0],
    [-6, -7, 0],
    [-6, -6, 0],
    [-6, -5, 0],
    [-6, -4, 0],
    [-6, -3, 0],
    [-6, -2, 0],
    [-6, -1, 0],
    [-6, 0, 0],
    [-6, 1, 0],
    [-6, 2, 0],
    [-6, 3, 0],
    [-6, 4, 0],
    [-6, 5, 0],
    [-6, 6, 0],
    [-6, 7, 0],
    [-6, 8, 0],
    [-5, -8, 0],
    [-5, -7, 0],
    [-5, -6, 0],
    [-5, -5, 0],
    [-5, -4, 0],
    [-5, -3, 0],
    [-5, -2, 0],
    [-5, -1, 0],
    [-5, 0, 0],
    [-5, 1, 0],
    [-5, 2, 0],
    [-5, 3, 0],
    [-5, 4, 0],
    [-5, 5, 0],
    [-5, 6, 0],
    [-5, 7, 0],
    [-5, 8, 0],
    [-4, -8, 0],
    [-4, -7, 0],
    [-4, -6, 0],
    [-4, -2, 0],
    [-4, -1, 0],
    [-4, 0, 0],
    [-4, 1, 0],
    [-4, 2, 0],
    [-4, 6, 0],
    [-4, 7, 0],
    [-4, 8, 0],
    [-3, -9, 0],
    [-3, -8, 0],
    [-3, -7, 0],
    [-3, -1, 0],
    [-3, 0, 0],
    [-3, 1, 0],
    [-3, 7, 0],
    [-3, 8, 0],
    [-2, -9, 0],
    [-2, -8, 0],
    [-2, -7, 0],
    [-2, -1, 0],
    [-2, 0, 0],
    [-2, 1, 0],
    [-2, 7, 0],
    [-2, 8, 0],
    [-2, 9, 0],
    [-1, -9, 0],
    [-1, -8, 0],
    [-1, -7, 0],
    [-1, -5, 0],
    [-1, -4, 0],
    [-1, -3, 0],
    [-1, -1, 0],
    [-1, 0, 0],
    [-1, 1, 0],
    [-1, 3, 0],
    [-1, 4, 0],
    [-1, 5, 0],
    [-1, 7, 0],
    [-1, 8, 0],
    [-1, 9, 0],
    [0, -9, 0],
    [0, -8, 0],
    [0, -7, 0],
    [0, -5, 0],
    [0, -4, 0],
    [0, -3, 0],
    [0, -1, 0],
    [0, 0, 0],
    [0, 1, 0],
    [0, 3, 0],
    [0, 4, 0],
    [0, 5, 0],
    [0, 7, 0],
    [0, 8, 0],
    [0, 9, 0],
    [1, -9, 0],
    [1, -8, 0],
    [1, -7, 0],
    [1, -5, 0],
    [1, -4, 0],
    [1, -3, 0],
    [1, -1, 0],
    [1, 0, 0],
    [1, 1, 0],
    [1, 3, 0],
    [1, 4, 0],
    [1, 5, 0],
    [1, 7, 0],
    [1, 8, 0],
    [1, 9, 0],
    [2, -9, 0],
    [2, -8, 0],
    [2, -7, 0],
    [2, -6, 0],
    [2, -5, 0],
    [2, -4, 0],
    [2, -3, 0],
    [2, -2, 0],
    [2, -1, 0],
    [2, 0, 0],
    [2, 1, 0],
    [2, 2, 0],
    [2, 3, 0],
    [2, 4, 0],
    [2, 5, 0],
    [2, 6, 0],
    [2, 7, 0],
    [2, 8, 0],
    [2, 9, 0],
    [3, -9, 0],
    [3, -8, 0],
    [3, -7, 0],
    [3, -6, 0],
    [3, -5, 0],
    [3, -4, 0],
    [3, -3, 0],
    [3, -2, 0],
    [3, -1, 0],
    [3, 0, 0],
    [3, 1, 0],
    [3, 2, 0],
    [3, 3, 0],
    [3, 4, 0],
    [3, 5, 0],
    [3, 6, 0],
    [3, 7, 0],
    [3, 8, 0],
    [3, 9, 0],
    [4, -9, 0],
    [4, -8, 0],
    [4, -7, 0],
    [4, -6, 0],
    [4, -5, 0],
    [4, -4, 0],
    [4, -3, 0],
    [4, -2, 0],
    [4, -1, 0],
    [4, 0, 0],
    [4, 1, 0],
    [4, 2, 0],
    [4, 3, 0],
    [4, 4, 0],
    [4, 5, 0],
    [4, 6, 0],
    [4, 7, 0],
    [4, 8, 0],
    [4, 9, 0],
    [5, -9, 0],
    [5, -8, 0],
    [5, -7, 0],
    [5, -6, 0],
    [5, -5, 0],
    [5, -4, 0],
    [5, -3, 0],
    [5, -2, 0],
    [5, -1, 0],
    [5, 0, 0],
    [5, 1, 0],
    [5, 2, 0],
    [5, 3, 0],
    [5, 4, 0],
    [5, 5, 0],
    [5, 6, 0],
    [5, 7, 0],
    [5, 8, 0],
    [5, 9, 0],
    [6, -9, 0],
    [6, -8, 0],
    [6, -7, 0],
    [6, -6, 0],
    [6, -5, 0],
    [6, -4, 0],
    [6, -3, 0],
    [6, -2, 0],
    [6, -1, 0],
    [6, 0, 0],
    [6, 1, 0],
    [6, 2, 0],
    [6, 3, 0],
    [6, 4, 0],
    [6, 5, 0],
    [6, 6, 0],
    [6, 7, 0],
    [6, 8, 0],
    [6, 9, 0],
    [7, -9, 0],
    [7, -8, 0],
    [7, -7, 0],
    [7, -6, 0],
    [7, -5, 0],
    [7, -4, 0],
    [7, -3, 0],
    [7, -2, 0],
    [7, -1, 0],
    [7, 0, 0],
    [7, 1, 0],
    [7, 2, 0],
    [7, 3, 0],
    [7, 4, 0],
    [7, 5, 0],
    [7, 6, 0],
    [7, 7, 0],
    [7, 8, 0],
    [7, 9, 0],
    [8, -9, 0],
    [8, -8, 0],
    [8, -7, 0],
    [8, -6, 0],
    [8, -5, 0],
    [8, -2, 0],
    [8, -1, 0],
    [8, 0, 0],
    [8, 1, 0],
    [8, 2, 0],
    [8, 5, 0],
    [8, 6, 0],
    [8, 7, 0],
    [8, 8, 0],
    [8, 9, 0],
    [9, -8, 0],
    [9, -7, 0],
    [9, -6, 0],
    [9, 0, 0],
    [9, 6, 0],
    [9, 7, 0],
    [9, 8, 0]
];

Bow1 = [
    [-5, -7, 0],
    [-5, -6, 0],
    [-5, 6, 0],
    [-5, 7, 0],
    [-4, -8, 0],
    [-4, -5, 0],
    [-4, -4, 0],
    [-4, 4, 0],
    [-4, 5, 0],
    [-4, 8, 0],
    [-3, -8, 0],
    [-3, -3, 0],
    [-3, 3, 0],
    [-3, 8, 0],
    [-2, -9, 0],
    [-2, -2, 0],
    [-2, -1, 0],
    [-2, 0, 0],
    [-2, 1, 0],
    [-2, 2, 0],
    [-2, 9, 0],
    [-1, -9, 0],
    [-1, -4, 0],
    [-1, -2, 0],
    [-1, -1, 0],
    [-1, 0, 0],
    [-1, 1, 0],
    [-1, 2, 0],
    [-1, 4, 0],
    [-1, 9, 0],
    [0, -9, 0],
    [0, -3, 0],
    [0, -2, 0],
    [0, -1, 0],
    [0, 0, 0],
    [0, 1, 0],
    [0, 2, 0],
    [0, 3, 0],
    [0, 9, 0],
    [1, -9, 0],
    [1, -4, 0],
    [1, -2, 0],
    [1, -1, 0],
    [1, 0, 0],
    [1, 1, 0],
    [1, 2, 0],
    [1, 4, 0],
    [1, 9, 0],
    [2, -9, 0],
    [2, -2, 0],
    [2, -1, 0],
    [2, 0, 0],
    [2, 1, 0],
    [2, 2, 0],
    [2, 9, 0],
    [3, -8, 0],
    [3, -3, 0],
    [3, 3, 0],
    [3, 8, 0],
    [4, -8, 0],
    [4, -5, 0],
    [4, -4, 0],
    [4, 4, 0],
    [4, 5, 0],
    [4, 8, 0],
    [5, -7, 0],
    [5, -6, 0],
    [5, 6, 0],
    [5, 7, 0]
];;


union() {
	rotate([0,90,0])  //might need to reset for printing
	{
    	drawshape();
    	drawring();
	}
}

module drawshape() {
    //Draw the shape we chose
    if (shape == 1) {
        pixel(SpaceShip1);
    } else if (shape == 2) {
        color("Blue")
        pixel(Alien1);
    } else if (shape == 3) {
        color("Blue")
        pixel(Alien2);
    } else if (shape == 4) {
        color("red")
        pixel(Heart);
    } else if (shape == 5) {
        color("red")
        pixel(Bow1);
    } else if (shape == 6) {
        color("green")
        pixel(Mushroom2);
    } else if (shape == 7) {
        color("black")
        pixel(Skull1);
    } else if (shape == 8) {
        color("black")
        pixel(Wait1);
    } else if (shape == 9) {
        pixel(Pacman1);
    } else if (shape == 10) {
        color("red")
        pixel(Pacman2);
    } else if (shape == 0) {
        color("red")
        pixel(Custom);
    }
}

module drawring() {
    //Draw the ring
    rotate(a = [0, 90, 0]) {
        translate([-(inner_radius + ring_thickness + (objectThickness / 2 * 0.9)), 0, 0]) {
            color("Silver")
            ring();
        }
    }
}
//Draw the pixel shape
module pixel(num) {
    union() {
        for (i = num) {
            translate(i * distance * 0.9) //the 0.9 guarantees some overlap
            cube([unitLength, unitWidth, objectThickness], center = true);
        }
    }
}


inner_diameter = ring_size;
inner_radius = inner_diameter / 2;

module ring() {
    if (ring_thickness == .8) {
        difference() {

            difference() {

                translate([0, 0, 0])
                cylinder(r = inner_radius + ring_thickness, h = ring_width, $fn = 100, center = true);
            }

            cylinder(r = inner_radius, h = ring_width + 1, $fn = 100, center = true);
        }
    } else {
        difference() {

            difference() {

                translate([0, 0, 0])
                cylinder(r = inner_radius + ring_thickness, h = ring_width, $fn = 100, center = true);
            }

            cylinder(r = inner_radius, h = ring_width + 1, $fn = 100, center = true);
        }
    }
}
